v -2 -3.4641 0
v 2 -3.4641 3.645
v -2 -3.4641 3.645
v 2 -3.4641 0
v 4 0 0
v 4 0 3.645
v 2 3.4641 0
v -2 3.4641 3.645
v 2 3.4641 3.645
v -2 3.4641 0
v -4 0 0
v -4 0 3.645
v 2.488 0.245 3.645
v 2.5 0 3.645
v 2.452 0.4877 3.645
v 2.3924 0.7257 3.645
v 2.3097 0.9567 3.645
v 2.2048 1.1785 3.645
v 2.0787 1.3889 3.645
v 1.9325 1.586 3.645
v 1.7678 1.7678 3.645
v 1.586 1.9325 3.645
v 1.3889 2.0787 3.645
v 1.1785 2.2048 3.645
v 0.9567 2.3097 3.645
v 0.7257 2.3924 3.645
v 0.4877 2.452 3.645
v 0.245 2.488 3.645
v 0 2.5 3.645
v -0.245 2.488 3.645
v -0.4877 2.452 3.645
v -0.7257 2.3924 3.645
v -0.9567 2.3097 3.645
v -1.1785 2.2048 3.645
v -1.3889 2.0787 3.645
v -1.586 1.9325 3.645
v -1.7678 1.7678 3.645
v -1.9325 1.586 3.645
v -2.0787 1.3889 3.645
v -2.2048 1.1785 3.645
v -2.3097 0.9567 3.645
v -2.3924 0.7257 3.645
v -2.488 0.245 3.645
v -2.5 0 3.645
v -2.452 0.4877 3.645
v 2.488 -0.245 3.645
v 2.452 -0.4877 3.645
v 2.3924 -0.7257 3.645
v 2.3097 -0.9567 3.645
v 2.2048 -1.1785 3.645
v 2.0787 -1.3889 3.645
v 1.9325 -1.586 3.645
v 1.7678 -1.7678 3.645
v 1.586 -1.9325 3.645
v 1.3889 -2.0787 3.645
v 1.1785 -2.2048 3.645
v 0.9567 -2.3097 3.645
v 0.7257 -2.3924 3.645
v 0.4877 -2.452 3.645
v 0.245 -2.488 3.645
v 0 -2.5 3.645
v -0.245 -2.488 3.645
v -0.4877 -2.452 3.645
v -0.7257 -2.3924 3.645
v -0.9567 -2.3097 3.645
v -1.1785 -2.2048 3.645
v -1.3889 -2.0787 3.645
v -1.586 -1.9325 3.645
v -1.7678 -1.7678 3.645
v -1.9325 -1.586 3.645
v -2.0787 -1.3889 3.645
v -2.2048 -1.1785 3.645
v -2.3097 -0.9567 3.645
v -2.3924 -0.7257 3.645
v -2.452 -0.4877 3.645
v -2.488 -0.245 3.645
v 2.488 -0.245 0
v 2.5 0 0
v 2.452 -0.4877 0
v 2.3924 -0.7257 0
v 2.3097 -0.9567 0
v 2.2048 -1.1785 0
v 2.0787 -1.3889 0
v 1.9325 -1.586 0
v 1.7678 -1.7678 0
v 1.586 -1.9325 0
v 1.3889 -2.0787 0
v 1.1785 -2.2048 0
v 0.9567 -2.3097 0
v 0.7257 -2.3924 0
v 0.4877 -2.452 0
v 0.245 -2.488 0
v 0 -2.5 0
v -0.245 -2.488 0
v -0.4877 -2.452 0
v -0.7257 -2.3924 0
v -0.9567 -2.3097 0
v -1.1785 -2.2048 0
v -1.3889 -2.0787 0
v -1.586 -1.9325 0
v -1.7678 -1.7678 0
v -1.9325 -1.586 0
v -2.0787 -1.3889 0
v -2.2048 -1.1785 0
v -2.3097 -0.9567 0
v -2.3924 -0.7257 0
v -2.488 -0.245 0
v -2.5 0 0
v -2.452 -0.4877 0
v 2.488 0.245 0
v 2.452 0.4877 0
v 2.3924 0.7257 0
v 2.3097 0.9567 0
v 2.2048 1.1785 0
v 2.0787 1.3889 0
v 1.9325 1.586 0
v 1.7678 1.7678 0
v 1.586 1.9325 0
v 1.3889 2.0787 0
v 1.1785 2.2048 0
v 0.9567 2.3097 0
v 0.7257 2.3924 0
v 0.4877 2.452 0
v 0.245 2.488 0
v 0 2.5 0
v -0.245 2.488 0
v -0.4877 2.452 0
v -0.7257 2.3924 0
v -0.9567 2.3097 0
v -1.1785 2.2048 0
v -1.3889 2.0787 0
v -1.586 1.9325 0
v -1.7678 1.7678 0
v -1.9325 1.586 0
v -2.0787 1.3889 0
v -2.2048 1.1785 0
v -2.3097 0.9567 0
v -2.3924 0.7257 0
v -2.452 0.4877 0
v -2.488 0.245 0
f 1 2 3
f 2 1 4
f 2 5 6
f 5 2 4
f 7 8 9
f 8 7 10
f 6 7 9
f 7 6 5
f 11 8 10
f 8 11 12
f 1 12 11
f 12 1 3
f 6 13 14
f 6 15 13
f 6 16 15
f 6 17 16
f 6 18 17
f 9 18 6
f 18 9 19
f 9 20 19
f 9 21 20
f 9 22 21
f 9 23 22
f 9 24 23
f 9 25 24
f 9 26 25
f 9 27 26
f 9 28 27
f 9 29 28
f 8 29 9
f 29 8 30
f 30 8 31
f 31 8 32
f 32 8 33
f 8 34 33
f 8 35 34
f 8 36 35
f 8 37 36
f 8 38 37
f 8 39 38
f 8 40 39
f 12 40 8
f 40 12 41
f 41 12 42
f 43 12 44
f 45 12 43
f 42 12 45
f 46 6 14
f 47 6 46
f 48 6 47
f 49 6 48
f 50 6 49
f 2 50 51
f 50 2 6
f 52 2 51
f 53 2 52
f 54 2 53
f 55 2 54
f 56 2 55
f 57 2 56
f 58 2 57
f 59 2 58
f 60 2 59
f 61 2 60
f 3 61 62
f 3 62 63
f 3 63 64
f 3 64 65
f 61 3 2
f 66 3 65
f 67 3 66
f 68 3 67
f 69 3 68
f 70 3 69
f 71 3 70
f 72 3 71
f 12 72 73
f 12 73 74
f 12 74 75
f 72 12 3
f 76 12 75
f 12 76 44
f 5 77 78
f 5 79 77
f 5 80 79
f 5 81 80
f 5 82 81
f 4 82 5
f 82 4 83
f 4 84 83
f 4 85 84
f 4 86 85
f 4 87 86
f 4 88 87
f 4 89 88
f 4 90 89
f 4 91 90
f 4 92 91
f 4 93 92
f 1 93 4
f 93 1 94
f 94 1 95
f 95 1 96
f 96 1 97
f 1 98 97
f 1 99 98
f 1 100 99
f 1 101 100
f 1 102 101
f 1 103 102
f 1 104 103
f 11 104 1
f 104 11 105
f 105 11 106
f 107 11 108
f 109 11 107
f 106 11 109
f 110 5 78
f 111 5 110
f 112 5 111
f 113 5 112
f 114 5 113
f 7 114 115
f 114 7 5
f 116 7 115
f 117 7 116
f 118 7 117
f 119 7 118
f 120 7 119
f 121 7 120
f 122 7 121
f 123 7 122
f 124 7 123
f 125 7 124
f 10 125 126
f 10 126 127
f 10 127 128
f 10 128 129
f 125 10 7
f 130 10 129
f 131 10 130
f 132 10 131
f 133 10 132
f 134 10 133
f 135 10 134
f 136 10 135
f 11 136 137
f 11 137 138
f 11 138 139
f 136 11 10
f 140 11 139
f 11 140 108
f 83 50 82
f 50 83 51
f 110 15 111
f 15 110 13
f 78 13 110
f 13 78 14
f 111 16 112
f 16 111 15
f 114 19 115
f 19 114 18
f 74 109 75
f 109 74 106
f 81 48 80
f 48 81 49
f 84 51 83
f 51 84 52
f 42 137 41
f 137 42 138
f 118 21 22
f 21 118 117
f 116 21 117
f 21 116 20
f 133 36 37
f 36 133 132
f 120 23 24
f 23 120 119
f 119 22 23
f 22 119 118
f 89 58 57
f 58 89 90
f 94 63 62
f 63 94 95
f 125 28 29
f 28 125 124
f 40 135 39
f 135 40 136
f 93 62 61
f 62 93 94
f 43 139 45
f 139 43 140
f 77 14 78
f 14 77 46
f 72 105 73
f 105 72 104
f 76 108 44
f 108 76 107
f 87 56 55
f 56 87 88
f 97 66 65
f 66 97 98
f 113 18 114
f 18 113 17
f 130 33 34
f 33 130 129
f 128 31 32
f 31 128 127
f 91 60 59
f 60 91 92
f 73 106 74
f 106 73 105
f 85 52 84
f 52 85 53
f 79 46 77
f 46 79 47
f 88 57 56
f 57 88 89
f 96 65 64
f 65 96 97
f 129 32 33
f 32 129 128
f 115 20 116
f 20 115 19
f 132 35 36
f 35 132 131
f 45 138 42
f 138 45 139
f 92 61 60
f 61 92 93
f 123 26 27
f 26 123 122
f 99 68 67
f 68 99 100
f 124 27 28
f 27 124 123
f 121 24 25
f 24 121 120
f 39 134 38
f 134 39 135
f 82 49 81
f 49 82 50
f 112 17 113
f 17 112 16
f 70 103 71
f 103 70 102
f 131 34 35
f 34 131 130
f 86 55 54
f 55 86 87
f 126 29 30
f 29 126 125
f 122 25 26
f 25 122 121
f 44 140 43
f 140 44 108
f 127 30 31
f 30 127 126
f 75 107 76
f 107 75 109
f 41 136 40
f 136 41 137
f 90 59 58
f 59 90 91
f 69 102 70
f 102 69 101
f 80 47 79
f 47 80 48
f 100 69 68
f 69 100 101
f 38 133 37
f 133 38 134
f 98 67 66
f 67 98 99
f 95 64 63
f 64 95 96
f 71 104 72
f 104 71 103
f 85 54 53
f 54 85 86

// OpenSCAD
module hex_nut() {
    difference() {
        // Hexagon shape
        scale([1, 1, 2.7/2]) 
            cylinder(d=8.0, h=2.7, $fn=6);
        // Hole for the screw
        translate([0, 0, -1])
            cylinder(d=5.0, h=4.7, $fn=64);
    }
}

hex_nut();
